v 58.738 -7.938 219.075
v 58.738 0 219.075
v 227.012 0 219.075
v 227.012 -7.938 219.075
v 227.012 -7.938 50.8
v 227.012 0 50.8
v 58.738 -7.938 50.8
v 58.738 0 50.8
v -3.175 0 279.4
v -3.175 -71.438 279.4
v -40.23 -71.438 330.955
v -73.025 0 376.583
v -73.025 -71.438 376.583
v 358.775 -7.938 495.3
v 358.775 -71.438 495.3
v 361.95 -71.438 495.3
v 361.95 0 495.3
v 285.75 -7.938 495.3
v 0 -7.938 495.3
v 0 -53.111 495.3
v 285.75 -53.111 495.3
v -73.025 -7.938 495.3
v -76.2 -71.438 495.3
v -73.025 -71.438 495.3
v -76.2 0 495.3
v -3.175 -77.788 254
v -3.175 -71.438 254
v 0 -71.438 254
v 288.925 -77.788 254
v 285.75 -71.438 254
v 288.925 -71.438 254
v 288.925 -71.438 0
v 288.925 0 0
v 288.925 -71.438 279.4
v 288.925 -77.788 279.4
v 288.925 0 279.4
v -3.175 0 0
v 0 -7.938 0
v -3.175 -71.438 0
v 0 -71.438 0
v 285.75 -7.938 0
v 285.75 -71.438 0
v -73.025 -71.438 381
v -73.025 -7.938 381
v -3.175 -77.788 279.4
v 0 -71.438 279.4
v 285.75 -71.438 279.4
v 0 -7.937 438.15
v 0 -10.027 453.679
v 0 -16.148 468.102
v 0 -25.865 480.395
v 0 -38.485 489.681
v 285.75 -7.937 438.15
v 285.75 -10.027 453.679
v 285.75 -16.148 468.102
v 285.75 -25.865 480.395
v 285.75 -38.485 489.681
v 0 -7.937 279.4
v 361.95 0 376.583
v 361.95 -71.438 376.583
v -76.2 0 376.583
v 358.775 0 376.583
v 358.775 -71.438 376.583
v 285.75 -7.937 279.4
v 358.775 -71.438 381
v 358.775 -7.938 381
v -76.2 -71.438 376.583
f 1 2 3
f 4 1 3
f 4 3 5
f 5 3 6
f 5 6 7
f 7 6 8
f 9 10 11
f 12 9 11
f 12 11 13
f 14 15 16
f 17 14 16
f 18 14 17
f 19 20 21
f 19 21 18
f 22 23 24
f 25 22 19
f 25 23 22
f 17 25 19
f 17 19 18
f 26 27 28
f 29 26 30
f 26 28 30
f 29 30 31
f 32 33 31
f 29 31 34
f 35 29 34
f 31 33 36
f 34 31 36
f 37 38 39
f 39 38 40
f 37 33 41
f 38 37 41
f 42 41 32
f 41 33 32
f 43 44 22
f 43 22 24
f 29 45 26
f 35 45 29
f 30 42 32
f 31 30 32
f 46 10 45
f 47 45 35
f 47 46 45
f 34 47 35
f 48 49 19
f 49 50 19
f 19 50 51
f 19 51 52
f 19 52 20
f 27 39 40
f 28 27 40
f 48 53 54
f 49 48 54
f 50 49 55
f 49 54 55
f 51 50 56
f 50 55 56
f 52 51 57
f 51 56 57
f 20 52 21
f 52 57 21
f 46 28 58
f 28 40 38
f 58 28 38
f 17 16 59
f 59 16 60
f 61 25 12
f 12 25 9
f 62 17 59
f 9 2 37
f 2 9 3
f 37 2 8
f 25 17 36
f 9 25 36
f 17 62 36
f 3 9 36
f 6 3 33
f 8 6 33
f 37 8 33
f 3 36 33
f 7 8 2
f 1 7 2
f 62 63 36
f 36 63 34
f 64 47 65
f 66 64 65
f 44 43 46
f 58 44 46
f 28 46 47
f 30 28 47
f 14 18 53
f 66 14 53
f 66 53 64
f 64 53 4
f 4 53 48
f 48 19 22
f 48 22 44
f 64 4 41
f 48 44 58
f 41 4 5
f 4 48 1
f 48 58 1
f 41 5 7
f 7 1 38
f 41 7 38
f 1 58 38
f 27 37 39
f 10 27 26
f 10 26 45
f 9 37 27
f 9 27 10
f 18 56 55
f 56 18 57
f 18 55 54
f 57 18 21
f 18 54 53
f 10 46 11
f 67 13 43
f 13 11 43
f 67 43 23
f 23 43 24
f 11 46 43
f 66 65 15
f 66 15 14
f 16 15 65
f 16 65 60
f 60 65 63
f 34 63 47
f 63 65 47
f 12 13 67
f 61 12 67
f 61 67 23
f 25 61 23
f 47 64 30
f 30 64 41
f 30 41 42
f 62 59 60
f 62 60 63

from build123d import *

# Parameters (mm, degrees)
F0_W      = 285.75
F0_H      = 279.4
F1_DEPTH  = 3.175
F2_W      = 285.75
F2_H      = 66.675
F3_DEPTH  = 215.9
F4_W      = 58.7375
F4_H      = 100.0125
F5_DEPTH  = 285.75
F6_W      = 285.75
F6_H      = 4.7625
F7_DEPTH  = 279.4
F9_DEPTH  = 25.4
F10_W     = 63.5
F10_H     = 279.4
F10_W_2   = 7.9375
F11_DEPTH = 3.175
F12_W     = 63.5
F12_H     = 279.4
F12_W_2   = 7.9375
F13_DEPTH = 3.175
F14_W     = 69.85
F14_H     = 71.4375
F15_DEPTH = 101.6
F17_DEPTH = 71.4375
F18_W     = 69.85
F18_H     = 71.4375
F19_DEPTH = 101.6
F21_DEPTH = 71.4375
F24_W     = 292.1
F24_H     = 25.4
F25_DEPTH = 6.35
F22_W     = 71.4375
F22_H     = 114.3
F22_H_2   = 4.4173913043
F26_DEPTH = 3.175
F23_W     = 71.4375
F23_H     = 4.4173913043
F23_H_2   = 114.3
F27_DEPTH = 3.175
F29_DEPTH = 101.6
F31_DEPTH = 25.4
F33_DEPTH = 101.6
F35_DEPTH = 25.4


with BuildPart() as f1:
    # F0 (on Front) → F1 (new body)
    with BuildSketch(Plane.XZ):
        with Locations((142.875, 139.7)):
            Rectangle(F0_W, F0_H)
    extrude(amount=F1_DEPTH)

    # F2 (on face) → F3 (join)
    with BuildSketch(Plane.XY.offset(279.4)):
        with Locations((142.875, -33.3375)):
            Rectangle(F2_W, F2_H)
    extrude(amount=F3_DEPTH)

    # F4 (on face) → F5 (cut)
    with BuildSketch(Plane.YZ.offset(285.75)):
        with Locations((-37.30625, 329.40625)):
            Rectangle(F4_W, F4_H)
        with BuildLine():
            Line((-7.9375, 379.4125), (-7.9375, 438.15))
            ThreePointArc((-7.9375, 438.15), (-25.1413154401, 396.6163154401), (-66.675, 379.4125))
            Line((-66.675, 379.4125), (-7.9375, 379.4125))
        make_face()
        with BuildLine():
            Line((-7.9375, 438.15), (-66.675, 438.15))
            Line((-66.675, 438.15), (-66.675, 379.4125))
            ThreePointArc((-66.675, 379.4125), (-25.1413154401, 396.6163154401), (-7.9375, 438.15))
        make_face()
        with BuildLine():
            Line((-53.1113940543, 495.3), (-66.675, 495.3))
            Line((-66.675, 495.3), (-66.675, 438.15))
            Line((-66.675, 438.15), (-7.9375, 438.15))
            ThreePointArc((-7.9375, 438.15), (-20.5947102305, 474.5739042527), (-53.1113940543, 495.3))
        make_face()
    extrude(amount=-F5_DEPTH, mode=Mode.SUBTRACT)

    # F6 (on face) → F7 (join)
    with BuildSketch(Plane(origin=(0, 0, 279.4), x_dir=(1, 0, 0), z_dir=(0, 0, -1))):
        with Locations((142.875, 5.55625)):
            Rectangle(F6_W, F6_H)
    extrude(amount=F7_DEPTH)

    # F8 (on face) → F9 (cut)
    with BuildSketch(Plane(origin=(0, 0, 0), x_dir=(-1, 0, 0), z_dir=(0, 1, 0))):
        Polygon((-227.0125, 50.8), (-142.875, 50.8), (-58.7375, 50.8), (-58.7375, 219.075), (-227.0125, 219.075), align=None)
    extrude(amount=-F9_DEPTH, mode=Mode.SUBTRACT)

    # F10 (on face) → F11 (join)
    with BuildSketch(Plane.YZ.offset(285.75)):
        with Locations((-39.6875, 139.7)):
            Rectangle(F10_W, F10_H)
        with Locations((-3.96875, 139.7)):
            Rectangle(F10_W_2, F10_H)
    extrude(amount=F11_DEPTH)

    # F12 (on face) → F13 (join)
    with BuildSketch(Plane(origin=(0, 0, 0), x_dir=(0, -1, 0), z_dir=(-1, 0, 0))):
        with Locations((39.6875, 139.7)):
            Rectangle(F12_W, F12_H)
        with Locations((3.96875, 139.7)):
            Rectangle(F12_W_2, F12_H)
    extrude(amount=F13_DEPTH)

    # F14 (on face) → F15 (join)
    with BuildSketch(Plane.XY.offset(279.4)):
        Polygon((0, -7.9375), (0, 0), (-3.175, 0), (-3.175, -71.4375), (0, -71.4375), align=None)
        with Locations((-38.1, -35.71875)):
            Rectangle(F14_W, F14_H)
    extrude(amount=F15_DEPTH)

    # F16 (on face) → F17 (cut)
    with BuildSketch(Plane.XZ.offset(71.4375)):
        Polygon((-73.025, 279.4), (-3.175, 279.4), (-40.2302153021, 330.9550821594), (-73.025, 376.5826086957), align=None)
        Polygon((-38.1367188436, 332.4597827389), (0, 279.4), (0, 381), (-73.025, 381), align=None)
    extrude(amount=-F17_DEPTH, mode=Mode.SUBTRACT)

    # F18 (on face) → F19 (join)
    with BuildSketch(Plane.XY.offset(279.4)):
        Polygon((288.925, 0), (285.75, 0), (285.75, -7.9375), (285.75, -71.4375), (288.925, -71.4375), align=None)
        with Locations((323.85, -35.71875)):
            Rectangle(F18_W, F18_H)
    extrude(amount=F19_DEPTH)

    # F20 (on face) → F21 (cut)
    with BuildSketch(Plane.XZ.offset(71.4375)):
        Polygon((285.75, 381), (285.75, 279.4), (324.7502719302, 333.6612479029), (358.775, 381), align=None)
        Polygon((326.8437683887, 332.1565473234), (288.925, 279.4), (358.775, 279.4), (358.775, 376.5826086957), align=None)
    extrude(amount=-F21_DEPTH, mode=Mode.SUBTRACT)

    # F24 (on face) → F25 (join)
    with BuildSketch(Plane.XZ.offset(71.4375)):
        with Locations((142.875, 266.7)):
            Rectangle(F24_W, F24_H)
    extrude(amount=F25_DEPTH)

    # F22 (on face) → F26 (join)
    with BuildSketch(Plane.YZ.offset(358.775)):
        with Locations((-35.71875, 438.15)):
            Rectangle(F22_W, F22_H)
        with Locations((-35.71875, 378.7913043478)):
            Rectangle(F22_W, F22_H_2)
    extrude(amount=F26_DEPTH)

    # F23 (on face) → F27 (join)
    with BuildSketch(Plane(origin=(-73.025, 0, 0), x_dir=(0, -1, 0), z_dir=(-1, 0, 0))):
        with Locations((35.71875, 378.7913043478)):
            Rectangle(F23_W, F23_H)
        with Locations((35.71875, 438.15)):
            Rectangle(F23_W, F23_H_2)
    extrude(amount=F27_DEPTH)

    # F28 (on face) → F29 (join)
    with BuildSketch(Plane(origin=(0, 0, 0), x_dir=(0, -1, 0), z_dir=(-1, 0, 0))):
        Polygon((7.9375, 495.3), (0, 495.3), (0, 279.4), (7.9375, 279.4), (7.9375, 438.15), align=None)
    extrude(amount=F29_DEPTH)

    # F30 (on face) → F31 (cut)
    with BuildSketch(Plane.XZ.offset(7.9375)):
        Polygon((-76.2, 376.5826086957), (-76.2, 495.3), (-101.6, 495.3), (-101.6, 279.4), (-3.175, 279.4), (-73.025, 376.5826086957), align=None)
    extrude(amount=-F31_DEPTH, mode=Mode.SUBTRACT)

    # F32 (on face) → F33 (join)
    with BuildSketch(Plane.YZ.offset(285.75)):
        Polygon((0, 279.4), (0, 495.3), (-7.9375, 495.3), (-7.9375, 438.15), (-7.9375, 279.4), align=None)
    extrude(amount=F33_DEPTH)

    # F34 (on face) → F35 (cut)
    with BuildSketch(Plane.XZ.offset(7.9375)):
        Polygon((387.35, 495.3), (361.95, 495.3), (361.95, 376.5826086957), (358.775, 376.5826086957), (288.925, 279.4), (387.35, 279.4), align=None)
    extrude(amount=-F35_DEPTH, mode=Mode.SUBTRACT)


solid = f1.part
